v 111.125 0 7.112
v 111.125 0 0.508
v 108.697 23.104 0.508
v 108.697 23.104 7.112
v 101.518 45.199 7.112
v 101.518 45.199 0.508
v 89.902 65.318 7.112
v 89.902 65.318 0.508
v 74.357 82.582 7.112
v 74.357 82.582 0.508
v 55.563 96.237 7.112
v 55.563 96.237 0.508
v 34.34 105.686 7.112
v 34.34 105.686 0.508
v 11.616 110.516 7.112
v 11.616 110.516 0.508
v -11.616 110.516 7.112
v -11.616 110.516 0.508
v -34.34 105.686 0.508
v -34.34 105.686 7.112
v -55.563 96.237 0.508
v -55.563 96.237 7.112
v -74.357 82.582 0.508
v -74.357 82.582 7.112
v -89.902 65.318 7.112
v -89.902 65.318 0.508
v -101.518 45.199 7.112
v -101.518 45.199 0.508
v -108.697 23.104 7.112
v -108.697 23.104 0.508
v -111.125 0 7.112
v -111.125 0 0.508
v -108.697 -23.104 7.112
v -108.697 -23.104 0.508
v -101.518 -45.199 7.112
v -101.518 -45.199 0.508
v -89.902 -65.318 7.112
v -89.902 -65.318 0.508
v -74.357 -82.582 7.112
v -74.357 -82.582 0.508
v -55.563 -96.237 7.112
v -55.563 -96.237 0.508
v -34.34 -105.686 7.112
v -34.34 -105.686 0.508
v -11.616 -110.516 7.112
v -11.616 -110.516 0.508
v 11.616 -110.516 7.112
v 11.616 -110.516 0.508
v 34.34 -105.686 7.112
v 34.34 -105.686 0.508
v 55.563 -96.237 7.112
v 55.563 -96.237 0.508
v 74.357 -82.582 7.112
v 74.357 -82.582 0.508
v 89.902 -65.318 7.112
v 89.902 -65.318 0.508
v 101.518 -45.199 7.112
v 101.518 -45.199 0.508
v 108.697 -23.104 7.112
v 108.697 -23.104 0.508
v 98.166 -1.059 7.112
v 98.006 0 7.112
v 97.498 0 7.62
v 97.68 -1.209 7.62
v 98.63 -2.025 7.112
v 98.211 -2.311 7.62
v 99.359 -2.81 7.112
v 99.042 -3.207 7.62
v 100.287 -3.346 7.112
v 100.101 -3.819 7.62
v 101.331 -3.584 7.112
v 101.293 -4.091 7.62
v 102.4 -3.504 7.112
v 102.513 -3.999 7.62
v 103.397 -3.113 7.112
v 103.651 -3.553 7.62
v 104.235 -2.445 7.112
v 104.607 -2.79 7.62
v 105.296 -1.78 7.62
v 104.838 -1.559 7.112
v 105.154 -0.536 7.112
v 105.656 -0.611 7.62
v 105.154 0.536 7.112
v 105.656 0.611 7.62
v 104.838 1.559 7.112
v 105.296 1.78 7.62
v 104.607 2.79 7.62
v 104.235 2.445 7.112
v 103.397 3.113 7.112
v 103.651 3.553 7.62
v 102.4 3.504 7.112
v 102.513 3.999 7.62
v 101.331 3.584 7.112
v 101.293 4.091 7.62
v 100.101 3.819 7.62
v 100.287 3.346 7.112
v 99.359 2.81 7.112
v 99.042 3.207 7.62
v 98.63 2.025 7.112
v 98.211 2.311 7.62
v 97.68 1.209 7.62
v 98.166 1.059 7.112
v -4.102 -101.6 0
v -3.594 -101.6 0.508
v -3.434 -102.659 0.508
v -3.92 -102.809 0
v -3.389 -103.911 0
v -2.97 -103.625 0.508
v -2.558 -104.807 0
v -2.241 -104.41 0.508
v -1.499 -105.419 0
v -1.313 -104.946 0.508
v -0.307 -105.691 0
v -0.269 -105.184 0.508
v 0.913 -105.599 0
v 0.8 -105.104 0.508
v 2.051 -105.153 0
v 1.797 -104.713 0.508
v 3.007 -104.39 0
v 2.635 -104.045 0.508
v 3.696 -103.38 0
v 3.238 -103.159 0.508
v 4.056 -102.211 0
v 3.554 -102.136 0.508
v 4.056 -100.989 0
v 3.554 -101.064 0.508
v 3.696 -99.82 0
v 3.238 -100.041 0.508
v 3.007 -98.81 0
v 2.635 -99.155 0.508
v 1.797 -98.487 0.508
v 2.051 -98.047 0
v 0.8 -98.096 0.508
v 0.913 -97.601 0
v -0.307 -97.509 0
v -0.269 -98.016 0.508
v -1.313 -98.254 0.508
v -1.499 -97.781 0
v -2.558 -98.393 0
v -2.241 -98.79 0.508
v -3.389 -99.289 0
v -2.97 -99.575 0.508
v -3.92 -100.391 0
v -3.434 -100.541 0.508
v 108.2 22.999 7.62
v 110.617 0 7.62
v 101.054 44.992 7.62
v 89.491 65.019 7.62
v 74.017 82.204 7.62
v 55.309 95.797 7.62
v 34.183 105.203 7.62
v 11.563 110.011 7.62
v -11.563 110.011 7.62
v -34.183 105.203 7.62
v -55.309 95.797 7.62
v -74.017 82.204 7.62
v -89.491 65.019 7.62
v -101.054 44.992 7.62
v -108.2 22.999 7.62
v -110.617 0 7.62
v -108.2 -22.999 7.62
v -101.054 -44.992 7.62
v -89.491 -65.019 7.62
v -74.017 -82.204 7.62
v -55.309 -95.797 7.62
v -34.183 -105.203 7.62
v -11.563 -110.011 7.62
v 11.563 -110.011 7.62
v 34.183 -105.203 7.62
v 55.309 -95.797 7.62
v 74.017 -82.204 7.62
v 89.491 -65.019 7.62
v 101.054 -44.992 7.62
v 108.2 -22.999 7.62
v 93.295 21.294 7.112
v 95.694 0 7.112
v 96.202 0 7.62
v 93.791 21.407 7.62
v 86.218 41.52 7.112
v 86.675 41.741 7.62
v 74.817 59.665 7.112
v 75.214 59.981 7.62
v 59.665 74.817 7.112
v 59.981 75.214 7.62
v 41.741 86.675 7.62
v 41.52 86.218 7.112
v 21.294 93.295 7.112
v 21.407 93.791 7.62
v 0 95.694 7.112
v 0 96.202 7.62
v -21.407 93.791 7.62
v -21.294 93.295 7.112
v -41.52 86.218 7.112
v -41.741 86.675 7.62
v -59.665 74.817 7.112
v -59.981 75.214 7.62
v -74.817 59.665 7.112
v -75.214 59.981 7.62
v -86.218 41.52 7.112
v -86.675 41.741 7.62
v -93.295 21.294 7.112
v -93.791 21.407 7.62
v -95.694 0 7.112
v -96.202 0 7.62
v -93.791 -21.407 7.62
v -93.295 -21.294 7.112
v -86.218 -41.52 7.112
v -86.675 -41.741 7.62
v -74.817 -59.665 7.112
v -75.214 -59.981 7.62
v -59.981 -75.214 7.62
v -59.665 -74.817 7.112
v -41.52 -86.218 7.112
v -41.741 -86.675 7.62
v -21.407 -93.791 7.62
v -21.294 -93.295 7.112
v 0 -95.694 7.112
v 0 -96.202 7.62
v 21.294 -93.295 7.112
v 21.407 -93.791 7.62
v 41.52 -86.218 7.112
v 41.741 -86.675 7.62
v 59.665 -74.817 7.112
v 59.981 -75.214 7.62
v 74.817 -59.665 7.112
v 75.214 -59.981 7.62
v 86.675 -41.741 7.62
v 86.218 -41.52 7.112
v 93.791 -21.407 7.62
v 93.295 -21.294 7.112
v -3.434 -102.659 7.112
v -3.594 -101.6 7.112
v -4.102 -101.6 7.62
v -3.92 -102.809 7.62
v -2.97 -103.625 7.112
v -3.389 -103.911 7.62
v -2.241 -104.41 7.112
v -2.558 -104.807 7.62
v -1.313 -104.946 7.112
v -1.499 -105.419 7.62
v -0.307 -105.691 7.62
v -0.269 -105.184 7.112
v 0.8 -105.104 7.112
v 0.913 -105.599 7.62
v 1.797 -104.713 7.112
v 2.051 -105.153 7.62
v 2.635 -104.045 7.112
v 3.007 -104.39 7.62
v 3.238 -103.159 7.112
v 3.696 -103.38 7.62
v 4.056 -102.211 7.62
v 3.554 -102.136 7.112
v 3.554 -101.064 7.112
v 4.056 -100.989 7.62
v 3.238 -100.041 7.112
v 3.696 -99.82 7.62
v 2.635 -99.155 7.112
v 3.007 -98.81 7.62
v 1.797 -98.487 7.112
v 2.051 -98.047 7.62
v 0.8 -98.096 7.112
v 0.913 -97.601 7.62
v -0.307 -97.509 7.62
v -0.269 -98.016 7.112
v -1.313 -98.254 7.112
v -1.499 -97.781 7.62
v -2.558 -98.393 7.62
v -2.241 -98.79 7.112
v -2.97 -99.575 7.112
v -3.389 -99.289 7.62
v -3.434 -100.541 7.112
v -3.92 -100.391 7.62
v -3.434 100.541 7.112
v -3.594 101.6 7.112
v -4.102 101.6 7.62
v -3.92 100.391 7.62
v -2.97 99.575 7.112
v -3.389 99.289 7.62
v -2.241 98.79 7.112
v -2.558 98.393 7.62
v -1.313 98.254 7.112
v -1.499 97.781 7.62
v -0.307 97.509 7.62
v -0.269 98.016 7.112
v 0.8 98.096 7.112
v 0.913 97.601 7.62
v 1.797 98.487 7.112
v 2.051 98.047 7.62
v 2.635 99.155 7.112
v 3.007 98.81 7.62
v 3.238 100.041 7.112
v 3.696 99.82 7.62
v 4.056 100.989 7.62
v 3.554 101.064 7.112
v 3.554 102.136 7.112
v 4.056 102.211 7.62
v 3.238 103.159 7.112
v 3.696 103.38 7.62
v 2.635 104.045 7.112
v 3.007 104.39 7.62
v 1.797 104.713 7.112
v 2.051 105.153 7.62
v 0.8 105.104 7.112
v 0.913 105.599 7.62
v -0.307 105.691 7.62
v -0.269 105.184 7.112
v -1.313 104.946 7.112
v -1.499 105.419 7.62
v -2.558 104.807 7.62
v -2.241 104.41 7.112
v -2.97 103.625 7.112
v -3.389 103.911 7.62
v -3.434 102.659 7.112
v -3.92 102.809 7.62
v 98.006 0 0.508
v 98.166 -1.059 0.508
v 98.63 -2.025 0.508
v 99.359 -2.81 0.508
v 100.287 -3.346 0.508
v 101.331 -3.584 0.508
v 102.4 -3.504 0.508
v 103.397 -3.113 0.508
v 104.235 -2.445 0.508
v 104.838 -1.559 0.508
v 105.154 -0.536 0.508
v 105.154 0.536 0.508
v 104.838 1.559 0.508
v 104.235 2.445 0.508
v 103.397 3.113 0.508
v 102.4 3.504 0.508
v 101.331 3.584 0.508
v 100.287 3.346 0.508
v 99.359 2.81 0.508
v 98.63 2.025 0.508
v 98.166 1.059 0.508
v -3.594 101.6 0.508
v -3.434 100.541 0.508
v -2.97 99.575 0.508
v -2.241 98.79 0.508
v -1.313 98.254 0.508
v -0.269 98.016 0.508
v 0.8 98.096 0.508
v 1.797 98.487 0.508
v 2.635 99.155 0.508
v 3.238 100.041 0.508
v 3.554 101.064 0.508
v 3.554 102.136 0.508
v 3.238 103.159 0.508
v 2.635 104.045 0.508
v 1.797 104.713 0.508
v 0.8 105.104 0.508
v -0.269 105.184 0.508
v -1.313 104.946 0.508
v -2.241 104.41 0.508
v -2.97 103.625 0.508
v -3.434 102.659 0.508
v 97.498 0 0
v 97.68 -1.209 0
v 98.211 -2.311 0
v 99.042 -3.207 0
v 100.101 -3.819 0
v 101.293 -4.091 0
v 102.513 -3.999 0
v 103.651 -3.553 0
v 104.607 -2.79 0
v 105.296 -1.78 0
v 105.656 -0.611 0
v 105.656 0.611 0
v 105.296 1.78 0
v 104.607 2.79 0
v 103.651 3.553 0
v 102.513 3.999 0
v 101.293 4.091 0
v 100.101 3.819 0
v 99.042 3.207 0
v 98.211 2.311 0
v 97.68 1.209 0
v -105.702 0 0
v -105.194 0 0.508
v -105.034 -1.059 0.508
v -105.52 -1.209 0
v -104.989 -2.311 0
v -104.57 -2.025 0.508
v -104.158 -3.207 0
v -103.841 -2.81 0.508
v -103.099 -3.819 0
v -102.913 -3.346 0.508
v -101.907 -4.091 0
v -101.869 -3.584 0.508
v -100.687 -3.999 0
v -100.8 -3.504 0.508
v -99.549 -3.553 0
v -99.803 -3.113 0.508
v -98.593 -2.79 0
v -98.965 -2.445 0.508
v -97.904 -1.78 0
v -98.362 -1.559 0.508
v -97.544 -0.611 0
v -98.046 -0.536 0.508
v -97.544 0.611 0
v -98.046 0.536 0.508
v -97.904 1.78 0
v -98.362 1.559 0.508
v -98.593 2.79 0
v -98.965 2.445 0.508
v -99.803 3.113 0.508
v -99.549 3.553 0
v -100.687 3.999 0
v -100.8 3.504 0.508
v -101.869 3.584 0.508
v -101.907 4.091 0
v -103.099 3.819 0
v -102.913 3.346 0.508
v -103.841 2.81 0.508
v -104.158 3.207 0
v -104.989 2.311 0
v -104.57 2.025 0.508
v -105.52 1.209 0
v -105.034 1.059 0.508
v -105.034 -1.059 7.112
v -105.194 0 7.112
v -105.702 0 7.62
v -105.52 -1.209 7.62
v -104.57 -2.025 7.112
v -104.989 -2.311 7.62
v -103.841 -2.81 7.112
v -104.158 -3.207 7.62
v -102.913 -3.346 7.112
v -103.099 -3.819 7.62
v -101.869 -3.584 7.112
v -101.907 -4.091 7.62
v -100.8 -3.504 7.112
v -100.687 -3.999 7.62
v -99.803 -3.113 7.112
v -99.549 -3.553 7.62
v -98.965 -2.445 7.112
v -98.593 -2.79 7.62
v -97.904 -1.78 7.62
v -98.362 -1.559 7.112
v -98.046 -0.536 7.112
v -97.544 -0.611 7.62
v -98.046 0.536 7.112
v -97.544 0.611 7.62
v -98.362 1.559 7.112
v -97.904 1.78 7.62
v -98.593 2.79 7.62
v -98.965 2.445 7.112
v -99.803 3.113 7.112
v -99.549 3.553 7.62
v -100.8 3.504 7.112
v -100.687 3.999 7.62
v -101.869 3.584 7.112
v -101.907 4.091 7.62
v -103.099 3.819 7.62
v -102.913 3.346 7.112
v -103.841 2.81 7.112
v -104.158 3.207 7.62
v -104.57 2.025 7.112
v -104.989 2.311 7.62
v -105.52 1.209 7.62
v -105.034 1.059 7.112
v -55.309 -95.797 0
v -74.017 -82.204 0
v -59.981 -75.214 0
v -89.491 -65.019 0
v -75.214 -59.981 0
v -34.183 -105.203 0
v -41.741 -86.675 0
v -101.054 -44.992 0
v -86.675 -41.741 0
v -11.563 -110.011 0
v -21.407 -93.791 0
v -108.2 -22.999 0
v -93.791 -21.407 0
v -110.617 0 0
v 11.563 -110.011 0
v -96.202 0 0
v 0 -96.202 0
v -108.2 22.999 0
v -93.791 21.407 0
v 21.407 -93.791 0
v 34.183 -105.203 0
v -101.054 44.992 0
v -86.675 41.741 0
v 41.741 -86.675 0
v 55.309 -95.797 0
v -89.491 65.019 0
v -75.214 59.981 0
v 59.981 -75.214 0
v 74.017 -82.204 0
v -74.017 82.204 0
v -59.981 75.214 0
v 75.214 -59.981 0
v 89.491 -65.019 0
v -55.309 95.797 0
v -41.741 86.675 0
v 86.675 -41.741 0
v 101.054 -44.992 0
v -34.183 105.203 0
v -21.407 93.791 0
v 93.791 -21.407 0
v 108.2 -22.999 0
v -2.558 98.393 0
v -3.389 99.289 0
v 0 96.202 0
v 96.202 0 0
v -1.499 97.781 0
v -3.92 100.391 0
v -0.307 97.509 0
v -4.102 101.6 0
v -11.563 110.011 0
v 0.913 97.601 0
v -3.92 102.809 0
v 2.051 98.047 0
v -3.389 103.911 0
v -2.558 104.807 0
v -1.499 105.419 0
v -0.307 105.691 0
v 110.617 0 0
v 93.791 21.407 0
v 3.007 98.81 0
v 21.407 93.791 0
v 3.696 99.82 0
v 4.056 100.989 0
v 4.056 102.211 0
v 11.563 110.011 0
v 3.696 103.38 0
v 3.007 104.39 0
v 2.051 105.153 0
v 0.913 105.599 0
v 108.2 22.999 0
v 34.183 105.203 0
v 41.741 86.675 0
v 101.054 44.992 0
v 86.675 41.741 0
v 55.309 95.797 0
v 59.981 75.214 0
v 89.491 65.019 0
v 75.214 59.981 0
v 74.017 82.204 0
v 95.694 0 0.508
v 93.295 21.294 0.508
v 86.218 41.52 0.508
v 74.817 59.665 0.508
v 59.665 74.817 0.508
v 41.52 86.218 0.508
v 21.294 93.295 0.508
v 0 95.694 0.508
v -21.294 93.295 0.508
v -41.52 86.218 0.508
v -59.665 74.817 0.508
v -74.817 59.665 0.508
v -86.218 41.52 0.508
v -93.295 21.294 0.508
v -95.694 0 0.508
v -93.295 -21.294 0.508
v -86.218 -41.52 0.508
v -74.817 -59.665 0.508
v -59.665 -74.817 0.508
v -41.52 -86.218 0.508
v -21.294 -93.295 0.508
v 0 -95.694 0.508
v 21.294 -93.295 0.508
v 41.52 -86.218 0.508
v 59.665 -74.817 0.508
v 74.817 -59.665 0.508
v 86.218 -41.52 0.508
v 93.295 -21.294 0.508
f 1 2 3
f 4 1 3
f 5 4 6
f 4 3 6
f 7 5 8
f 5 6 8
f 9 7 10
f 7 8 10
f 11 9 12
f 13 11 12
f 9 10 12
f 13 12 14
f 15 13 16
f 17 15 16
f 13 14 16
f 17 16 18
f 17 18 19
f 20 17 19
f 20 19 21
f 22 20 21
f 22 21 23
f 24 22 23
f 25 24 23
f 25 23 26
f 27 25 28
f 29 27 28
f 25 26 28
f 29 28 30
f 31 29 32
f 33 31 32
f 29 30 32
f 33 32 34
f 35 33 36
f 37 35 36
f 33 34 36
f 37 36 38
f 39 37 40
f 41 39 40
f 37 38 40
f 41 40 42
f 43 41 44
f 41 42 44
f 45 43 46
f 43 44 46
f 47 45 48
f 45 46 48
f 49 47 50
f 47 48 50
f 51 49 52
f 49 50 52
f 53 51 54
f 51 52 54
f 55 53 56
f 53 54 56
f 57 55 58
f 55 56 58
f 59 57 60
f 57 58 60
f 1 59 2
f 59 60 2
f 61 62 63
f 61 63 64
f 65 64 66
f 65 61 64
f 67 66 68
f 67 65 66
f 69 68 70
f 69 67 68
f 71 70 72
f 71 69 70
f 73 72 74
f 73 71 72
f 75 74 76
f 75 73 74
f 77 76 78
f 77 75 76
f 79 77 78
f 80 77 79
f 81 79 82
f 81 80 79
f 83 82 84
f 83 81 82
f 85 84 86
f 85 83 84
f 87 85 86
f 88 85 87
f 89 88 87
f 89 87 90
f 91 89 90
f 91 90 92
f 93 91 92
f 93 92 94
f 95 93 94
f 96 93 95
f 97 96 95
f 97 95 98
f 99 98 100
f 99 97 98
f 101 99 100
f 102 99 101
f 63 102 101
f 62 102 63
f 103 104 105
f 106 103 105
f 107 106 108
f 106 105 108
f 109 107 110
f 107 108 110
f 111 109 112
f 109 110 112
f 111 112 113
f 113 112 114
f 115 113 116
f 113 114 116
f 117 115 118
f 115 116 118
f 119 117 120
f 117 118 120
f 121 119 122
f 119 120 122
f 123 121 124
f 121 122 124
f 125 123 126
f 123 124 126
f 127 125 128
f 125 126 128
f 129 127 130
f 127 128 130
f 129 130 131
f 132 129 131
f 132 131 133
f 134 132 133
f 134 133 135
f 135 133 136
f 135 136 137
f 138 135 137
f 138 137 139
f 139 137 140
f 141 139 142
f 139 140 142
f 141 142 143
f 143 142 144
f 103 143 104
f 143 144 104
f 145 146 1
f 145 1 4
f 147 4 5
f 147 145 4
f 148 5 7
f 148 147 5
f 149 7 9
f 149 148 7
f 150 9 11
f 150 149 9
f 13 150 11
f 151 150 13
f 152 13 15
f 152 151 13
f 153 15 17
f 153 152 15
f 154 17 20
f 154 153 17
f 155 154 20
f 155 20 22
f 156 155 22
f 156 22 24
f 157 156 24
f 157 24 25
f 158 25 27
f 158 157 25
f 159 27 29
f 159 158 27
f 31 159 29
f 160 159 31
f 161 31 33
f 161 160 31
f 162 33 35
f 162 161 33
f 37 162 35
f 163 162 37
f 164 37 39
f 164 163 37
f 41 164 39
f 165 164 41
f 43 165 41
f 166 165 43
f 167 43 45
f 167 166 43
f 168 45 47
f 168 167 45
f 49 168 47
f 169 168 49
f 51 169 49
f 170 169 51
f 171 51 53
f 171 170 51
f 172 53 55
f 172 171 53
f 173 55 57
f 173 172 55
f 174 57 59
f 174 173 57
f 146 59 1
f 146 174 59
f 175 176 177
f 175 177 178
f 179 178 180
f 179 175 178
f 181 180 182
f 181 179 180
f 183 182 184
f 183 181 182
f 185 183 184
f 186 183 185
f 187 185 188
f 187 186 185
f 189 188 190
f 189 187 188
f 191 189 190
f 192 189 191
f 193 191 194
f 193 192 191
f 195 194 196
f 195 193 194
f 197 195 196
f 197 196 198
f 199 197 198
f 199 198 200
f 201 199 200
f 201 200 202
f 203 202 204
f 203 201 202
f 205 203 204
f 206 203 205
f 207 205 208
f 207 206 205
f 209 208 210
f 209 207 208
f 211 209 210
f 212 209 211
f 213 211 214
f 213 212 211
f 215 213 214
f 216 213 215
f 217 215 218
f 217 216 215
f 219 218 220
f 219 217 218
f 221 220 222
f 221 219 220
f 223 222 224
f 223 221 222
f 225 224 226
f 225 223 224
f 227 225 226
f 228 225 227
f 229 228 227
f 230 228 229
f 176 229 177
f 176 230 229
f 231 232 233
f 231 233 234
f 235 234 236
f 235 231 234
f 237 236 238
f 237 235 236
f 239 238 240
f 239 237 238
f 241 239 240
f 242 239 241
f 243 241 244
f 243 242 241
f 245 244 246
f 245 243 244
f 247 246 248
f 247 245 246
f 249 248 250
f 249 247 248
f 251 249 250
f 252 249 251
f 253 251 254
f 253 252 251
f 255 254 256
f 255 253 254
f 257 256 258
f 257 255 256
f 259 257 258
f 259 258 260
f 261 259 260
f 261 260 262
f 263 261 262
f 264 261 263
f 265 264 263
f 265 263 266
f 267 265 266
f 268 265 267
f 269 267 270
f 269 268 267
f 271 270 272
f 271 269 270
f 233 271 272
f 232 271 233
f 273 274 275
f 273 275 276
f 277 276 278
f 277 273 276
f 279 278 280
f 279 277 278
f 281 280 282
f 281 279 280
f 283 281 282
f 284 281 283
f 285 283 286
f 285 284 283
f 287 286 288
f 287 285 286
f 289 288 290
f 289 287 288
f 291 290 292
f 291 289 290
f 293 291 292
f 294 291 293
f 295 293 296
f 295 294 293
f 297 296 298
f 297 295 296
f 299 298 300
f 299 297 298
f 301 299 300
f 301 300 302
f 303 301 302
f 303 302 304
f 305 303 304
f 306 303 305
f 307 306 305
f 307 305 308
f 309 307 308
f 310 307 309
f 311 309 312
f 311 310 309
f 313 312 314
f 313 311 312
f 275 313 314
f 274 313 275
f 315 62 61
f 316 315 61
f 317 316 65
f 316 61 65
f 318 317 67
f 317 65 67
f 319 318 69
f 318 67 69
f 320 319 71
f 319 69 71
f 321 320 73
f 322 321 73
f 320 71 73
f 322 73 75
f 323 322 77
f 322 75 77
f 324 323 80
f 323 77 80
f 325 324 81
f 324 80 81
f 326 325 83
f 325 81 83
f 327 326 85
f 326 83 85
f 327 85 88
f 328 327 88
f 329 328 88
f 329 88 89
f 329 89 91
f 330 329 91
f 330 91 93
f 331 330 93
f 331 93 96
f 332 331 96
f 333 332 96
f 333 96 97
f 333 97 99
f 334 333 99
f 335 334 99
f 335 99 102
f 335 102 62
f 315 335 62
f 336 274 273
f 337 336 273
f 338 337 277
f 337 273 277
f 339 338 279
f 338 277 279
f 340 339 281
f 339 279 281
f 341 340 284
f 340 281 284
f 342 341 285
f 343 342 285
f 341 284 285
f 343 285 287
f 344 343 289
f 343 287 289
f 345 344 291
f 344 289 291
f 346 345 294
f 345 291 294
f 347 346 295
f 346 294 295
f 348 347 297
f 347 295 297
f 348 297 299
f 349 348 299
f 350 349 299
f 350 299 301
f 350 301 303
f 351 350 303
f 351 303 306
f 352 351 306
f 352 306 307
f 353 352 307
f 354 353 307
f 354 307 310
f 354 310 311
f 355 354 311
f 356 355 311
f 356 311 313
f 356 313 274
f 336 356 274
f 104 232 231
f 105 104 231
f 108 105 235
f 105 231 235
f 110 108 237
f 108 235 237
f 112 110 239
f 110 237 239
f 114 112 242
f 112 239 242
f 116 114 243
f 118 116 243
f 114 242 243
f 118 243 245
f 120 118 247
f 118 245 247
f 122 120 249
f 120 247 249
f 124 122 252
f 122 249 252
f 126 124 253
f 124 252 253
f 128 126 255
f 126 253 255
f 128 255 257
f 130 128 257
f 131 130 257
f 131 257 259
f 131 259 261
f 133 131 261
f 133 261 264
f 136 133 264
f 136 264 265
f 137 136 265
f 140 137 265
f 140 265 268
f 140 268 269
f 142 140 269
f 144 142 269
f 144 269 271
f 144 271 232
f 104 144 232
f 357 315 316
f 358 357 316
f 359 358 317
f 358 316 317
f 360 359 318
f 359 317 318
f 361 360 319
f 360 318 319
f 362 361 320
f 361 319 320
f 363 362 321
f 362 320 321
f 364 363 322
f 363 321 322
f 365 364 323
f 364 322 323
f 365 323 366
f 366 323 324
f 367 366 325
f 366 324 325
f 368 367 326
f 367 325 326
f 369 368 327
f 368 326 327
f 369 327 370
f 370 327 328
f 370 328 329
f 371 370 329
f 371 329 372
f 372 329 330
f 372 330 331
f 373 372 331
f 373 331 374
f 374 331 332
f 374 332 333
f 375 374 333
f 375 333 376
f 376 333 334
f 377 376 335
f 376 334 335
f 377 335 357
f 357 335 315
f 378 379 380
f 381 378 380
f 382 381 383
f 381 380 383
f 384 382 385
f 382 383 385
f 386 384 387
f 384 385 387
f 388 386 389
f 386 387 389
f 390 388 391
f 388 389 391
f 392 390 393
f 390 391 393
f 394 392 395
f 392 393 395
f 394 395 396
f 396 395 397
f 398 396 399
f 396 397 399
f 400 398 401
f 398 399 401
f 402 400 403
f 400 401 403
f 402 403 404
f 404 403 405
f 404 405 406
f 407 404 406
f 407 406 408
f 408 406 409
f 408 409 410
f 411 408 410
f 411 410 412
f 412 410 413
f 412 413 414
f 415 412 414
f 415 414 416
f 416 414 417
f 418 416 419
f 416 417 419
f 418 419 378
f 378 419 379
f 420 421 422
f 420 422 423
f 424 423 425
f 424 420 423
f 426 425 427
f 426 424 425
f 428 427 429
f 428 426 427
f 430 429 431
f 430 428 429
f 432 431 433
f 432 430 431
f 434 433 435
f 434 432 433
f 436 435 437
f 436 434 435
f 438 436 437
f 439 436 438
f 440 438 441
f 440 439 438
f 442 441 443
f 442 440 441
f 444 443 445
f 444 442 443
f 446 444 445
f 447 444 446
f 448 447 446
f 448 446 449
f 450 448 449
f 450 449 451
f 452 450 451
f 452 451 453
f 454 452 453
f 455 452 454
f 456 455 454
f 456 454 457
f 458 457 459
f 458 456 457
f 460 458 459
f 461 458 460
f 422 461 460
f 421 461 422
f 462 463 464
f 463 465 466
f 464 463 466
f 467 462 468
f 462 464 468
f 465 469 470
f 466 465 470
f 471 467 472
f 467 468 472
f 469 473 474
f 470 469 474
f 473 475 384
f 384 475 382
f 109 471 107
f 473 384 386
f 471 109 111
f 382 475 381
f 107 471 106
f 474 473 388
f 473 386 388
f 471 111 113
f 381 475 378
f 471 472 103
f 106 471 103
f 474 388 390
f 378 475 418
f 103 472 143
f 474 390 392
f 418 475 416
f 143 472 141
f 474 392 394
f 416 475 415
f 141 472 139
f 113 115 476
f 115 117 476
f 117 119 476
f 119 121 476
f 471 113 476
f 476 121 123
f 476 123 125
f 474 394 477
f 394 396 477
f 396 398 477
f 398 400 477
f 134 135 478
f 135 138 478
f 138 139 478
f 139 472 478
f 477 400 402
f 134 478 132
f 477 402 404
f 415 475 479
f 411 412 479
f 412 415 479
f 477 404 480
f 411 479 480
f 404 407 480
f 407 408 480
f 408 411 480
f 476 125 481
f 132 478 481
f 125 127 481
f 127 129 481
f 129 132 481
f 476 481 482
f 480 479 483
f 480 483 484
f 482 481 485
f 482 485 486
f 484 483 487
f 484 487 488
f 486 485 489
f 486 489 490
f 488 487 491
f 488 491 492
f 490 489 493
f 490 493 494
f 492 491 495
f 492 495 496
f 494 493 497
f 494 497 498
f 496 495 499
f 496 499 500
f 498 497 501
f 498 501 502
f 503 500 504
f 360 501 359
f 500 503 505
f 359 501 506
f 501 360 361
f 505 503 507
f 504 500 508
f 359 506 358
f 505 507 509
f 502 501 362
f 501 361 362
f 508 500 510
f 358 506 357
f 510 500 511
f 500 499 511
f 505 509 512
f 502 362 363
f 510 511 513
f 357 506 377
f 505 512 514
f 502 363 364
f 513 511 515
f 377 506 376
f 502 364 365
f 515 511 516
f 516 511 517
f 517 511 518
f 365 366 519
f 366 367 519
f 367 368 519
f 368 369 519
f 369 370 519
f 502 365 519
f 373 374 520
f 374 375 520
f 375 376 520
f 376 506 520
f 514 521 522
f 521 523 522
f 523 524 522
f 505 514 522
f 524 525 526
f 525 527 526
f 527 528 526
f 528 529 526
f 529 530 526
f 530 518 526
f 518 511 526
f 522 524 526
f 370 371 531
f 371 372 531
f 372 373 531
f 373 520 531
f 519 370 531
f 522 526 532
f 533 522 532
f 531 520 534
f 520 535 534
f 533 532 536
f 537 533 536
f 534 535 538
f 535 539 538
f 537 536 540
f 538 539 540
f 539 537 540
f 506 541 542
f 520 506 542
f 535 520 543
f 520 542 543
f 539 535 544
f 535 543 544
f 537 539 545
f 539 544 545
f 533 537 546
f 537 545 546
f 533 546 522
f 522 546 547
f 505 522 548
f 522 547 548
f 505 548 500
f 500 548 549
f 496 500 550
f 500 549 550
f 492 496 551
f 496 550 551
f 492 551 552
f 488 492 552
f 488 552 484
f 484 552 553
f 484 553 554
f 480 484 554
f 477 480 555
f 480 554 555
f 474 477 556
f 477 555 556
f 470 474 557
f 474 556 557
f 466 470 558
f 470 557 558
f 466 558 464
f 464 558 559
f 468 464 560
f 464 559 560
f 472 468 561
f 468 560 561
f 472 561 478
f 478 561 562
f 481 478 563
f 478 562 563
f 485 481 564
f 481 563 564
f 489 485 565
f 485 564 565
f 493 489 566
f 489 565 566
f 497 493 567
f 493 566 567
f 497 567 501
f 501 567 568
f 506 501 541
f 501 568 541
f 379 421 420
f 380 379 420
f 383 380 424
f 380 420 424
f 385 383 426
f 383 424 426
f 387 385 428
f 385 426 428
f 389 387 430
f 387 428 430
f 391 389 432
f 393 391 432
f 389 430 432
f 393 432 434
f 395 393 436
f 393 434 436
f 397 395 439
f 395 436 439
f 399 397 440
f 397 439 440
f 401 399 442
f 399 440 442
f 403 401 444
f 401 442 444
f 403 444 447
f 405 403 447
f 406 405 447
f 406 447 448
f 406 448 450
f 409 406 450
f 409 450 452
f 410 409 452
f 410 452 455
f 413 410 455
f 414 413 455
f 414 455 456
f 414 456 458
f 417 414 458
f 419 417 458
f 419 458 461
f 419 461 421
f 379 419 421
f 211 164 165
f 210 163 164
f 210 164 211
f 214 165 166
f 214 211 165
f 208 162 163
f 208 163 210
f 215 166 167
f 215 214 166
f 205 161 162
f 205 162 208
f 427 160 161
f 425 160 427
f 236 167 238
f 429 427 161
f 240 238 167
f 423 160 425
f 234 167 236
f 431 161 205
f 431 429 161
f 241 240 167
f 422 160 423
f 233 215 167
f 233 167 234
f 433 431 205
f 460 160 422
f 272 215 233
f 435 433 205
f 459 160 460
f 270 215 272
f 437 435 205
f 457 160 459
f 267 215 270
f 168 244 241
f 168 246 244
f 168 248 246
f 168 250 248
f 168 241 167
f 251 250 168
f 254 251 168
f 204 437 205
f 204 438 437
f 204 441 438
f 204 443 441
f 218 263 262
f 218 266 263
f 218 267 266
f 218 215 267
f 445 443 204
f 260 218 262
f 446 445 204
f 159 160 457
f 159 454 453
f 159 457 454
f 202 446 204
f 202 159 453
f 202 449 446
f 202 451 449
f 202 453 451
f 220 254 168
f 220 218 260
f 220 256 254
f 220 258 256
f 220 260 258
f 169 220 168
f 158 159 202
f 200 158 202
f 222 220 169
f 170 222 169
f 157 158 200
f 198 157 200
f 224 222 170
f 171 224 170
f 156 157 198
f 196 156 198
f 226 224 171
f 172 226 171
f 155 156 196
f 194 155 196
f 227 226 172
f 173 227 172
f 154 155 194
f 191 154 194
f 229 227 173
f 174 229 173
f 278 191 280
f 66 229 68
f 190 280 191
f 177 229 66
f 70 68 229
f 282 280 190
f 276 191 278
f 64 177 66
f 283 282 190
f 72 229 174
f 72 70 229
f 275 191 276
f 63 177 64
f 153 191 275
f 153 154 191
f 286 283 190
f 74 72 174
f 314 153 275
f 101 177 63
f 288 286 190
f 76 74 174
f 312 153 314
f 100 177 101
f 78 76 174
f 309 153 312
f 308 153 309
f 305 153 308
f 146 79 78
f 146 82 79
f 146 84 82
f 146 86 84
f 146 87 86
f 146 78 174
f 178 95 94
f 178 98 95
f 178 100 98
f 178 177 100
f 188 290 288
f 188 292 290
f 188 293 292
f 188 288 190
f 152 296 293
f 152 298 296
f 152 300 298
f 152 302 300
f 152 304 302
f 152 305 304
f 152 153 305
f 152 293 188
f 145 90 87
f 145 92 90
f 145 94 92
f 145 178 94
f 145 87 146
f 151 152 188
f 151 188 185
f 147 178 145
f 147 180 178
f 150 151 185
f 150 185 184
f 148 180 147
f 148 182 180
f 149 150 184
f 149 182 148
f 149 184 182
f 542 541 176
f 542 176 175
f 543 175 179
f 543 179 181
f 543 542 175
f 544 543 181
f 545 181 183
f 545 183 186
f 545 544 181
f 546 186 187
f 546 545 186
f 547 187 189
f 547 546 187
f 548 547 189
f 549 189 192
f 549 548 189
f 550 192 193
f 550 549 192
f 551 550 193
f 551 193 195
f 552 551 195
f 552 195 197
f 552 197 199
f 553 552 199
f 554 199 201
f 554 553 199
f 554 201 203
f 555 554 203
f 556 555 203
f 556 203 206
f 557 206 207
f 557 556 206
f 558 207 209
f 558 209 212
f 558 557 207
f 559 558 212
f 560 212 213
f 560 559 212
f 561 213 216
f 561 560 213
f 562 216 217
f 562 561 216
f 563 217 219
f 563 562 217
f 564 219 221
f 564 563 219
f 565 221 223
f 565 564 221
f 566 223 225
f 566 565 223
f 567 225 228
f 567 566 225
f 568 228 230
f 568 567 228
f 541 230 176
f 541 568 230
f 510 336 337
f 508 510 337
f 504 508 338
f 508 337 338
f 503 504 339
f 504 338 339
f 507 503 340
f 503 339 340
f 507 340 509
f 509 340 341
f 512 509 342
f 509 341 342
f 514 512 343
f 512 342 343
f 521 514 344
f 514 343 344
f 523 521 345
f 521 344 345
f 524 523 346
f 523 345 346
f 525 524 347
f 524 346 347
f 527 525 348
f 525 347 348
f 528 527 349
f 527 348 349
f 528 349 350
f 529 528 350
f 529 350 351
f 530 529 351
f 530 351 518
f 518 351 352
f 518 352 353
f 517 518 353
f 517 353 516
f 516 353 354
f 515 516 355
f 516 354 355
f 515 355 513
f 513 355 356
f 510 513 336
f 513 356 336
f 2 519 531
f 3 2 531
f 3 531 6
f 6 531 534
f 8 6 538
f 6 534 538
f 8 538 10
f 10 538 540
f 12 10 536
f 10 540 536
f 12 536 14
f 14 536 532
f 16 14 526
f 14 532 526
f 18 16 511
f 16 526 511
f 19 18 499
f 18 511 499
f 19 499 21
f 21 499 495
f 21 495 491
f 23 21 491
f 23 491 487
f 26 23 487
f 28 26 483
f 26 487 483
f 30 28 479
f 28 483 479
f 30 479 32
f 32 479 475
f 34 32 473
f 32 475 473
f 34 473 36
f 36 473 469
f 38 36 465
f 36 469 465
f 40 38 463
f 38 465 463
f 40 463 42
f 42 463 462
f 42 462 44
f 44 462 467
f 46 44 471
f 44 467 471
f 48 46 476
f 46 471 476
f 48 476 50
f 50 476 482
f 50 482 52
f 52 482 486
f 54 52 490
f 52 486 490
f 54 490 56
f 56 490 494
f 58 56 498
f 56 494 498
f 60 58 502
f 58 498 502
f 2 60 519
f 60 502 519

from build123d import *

# Parameters (mm, degrees)
F0_R     = 111.125
F0_R_2   = 95.6945
F1_DEPTH = 7.62
F3_D     = 7.1882
F4_SIZE  = 0.508


with BuildPart() as f1:
    # F0 (on Top) → F1 (new body)
    with BuildSketch(Plane.XY):
        Circle(F0_R)
        Circle(F0_R_2, mode=Mode.SUBTRACT)
    extrude(amount=F1_DEPTH)

    # F3 (through all)
    with Locations(Plane(origin=(0, 0, 0), x_dir=(1, 0, 0), z_dir=(0, 0, -1))):
        with Locations((-101.6, 0), (0, -101.6), (101.6, 0), (0, 101.6)):
            Hole(F3_D / 2)

    # F4
    f4_edges = [f1.edges().sort_by_distance(p)[0] for p in [
        (-111.125, 0, 7.62),
        (-95.6945, 0, 0),
        (-95.6945, 0, 7.62),
        (-111.125, 0, 0),
        (-3.5941, -101.6, 0),
        (-105.1941, 0, 0),
        (98.0059, 0, 0),
        (-3.5941, 101.6, 0),
        (-3.5941, -101.6, 7.62),
        (-105.1941, 0, 7.62),
        (98.0059, 0, 7.62),
        (-3.5941, 101.6, 7.62),
    ]]
    chamfer(f4_edges, length=F4_SIZE)


solid = f1.part
